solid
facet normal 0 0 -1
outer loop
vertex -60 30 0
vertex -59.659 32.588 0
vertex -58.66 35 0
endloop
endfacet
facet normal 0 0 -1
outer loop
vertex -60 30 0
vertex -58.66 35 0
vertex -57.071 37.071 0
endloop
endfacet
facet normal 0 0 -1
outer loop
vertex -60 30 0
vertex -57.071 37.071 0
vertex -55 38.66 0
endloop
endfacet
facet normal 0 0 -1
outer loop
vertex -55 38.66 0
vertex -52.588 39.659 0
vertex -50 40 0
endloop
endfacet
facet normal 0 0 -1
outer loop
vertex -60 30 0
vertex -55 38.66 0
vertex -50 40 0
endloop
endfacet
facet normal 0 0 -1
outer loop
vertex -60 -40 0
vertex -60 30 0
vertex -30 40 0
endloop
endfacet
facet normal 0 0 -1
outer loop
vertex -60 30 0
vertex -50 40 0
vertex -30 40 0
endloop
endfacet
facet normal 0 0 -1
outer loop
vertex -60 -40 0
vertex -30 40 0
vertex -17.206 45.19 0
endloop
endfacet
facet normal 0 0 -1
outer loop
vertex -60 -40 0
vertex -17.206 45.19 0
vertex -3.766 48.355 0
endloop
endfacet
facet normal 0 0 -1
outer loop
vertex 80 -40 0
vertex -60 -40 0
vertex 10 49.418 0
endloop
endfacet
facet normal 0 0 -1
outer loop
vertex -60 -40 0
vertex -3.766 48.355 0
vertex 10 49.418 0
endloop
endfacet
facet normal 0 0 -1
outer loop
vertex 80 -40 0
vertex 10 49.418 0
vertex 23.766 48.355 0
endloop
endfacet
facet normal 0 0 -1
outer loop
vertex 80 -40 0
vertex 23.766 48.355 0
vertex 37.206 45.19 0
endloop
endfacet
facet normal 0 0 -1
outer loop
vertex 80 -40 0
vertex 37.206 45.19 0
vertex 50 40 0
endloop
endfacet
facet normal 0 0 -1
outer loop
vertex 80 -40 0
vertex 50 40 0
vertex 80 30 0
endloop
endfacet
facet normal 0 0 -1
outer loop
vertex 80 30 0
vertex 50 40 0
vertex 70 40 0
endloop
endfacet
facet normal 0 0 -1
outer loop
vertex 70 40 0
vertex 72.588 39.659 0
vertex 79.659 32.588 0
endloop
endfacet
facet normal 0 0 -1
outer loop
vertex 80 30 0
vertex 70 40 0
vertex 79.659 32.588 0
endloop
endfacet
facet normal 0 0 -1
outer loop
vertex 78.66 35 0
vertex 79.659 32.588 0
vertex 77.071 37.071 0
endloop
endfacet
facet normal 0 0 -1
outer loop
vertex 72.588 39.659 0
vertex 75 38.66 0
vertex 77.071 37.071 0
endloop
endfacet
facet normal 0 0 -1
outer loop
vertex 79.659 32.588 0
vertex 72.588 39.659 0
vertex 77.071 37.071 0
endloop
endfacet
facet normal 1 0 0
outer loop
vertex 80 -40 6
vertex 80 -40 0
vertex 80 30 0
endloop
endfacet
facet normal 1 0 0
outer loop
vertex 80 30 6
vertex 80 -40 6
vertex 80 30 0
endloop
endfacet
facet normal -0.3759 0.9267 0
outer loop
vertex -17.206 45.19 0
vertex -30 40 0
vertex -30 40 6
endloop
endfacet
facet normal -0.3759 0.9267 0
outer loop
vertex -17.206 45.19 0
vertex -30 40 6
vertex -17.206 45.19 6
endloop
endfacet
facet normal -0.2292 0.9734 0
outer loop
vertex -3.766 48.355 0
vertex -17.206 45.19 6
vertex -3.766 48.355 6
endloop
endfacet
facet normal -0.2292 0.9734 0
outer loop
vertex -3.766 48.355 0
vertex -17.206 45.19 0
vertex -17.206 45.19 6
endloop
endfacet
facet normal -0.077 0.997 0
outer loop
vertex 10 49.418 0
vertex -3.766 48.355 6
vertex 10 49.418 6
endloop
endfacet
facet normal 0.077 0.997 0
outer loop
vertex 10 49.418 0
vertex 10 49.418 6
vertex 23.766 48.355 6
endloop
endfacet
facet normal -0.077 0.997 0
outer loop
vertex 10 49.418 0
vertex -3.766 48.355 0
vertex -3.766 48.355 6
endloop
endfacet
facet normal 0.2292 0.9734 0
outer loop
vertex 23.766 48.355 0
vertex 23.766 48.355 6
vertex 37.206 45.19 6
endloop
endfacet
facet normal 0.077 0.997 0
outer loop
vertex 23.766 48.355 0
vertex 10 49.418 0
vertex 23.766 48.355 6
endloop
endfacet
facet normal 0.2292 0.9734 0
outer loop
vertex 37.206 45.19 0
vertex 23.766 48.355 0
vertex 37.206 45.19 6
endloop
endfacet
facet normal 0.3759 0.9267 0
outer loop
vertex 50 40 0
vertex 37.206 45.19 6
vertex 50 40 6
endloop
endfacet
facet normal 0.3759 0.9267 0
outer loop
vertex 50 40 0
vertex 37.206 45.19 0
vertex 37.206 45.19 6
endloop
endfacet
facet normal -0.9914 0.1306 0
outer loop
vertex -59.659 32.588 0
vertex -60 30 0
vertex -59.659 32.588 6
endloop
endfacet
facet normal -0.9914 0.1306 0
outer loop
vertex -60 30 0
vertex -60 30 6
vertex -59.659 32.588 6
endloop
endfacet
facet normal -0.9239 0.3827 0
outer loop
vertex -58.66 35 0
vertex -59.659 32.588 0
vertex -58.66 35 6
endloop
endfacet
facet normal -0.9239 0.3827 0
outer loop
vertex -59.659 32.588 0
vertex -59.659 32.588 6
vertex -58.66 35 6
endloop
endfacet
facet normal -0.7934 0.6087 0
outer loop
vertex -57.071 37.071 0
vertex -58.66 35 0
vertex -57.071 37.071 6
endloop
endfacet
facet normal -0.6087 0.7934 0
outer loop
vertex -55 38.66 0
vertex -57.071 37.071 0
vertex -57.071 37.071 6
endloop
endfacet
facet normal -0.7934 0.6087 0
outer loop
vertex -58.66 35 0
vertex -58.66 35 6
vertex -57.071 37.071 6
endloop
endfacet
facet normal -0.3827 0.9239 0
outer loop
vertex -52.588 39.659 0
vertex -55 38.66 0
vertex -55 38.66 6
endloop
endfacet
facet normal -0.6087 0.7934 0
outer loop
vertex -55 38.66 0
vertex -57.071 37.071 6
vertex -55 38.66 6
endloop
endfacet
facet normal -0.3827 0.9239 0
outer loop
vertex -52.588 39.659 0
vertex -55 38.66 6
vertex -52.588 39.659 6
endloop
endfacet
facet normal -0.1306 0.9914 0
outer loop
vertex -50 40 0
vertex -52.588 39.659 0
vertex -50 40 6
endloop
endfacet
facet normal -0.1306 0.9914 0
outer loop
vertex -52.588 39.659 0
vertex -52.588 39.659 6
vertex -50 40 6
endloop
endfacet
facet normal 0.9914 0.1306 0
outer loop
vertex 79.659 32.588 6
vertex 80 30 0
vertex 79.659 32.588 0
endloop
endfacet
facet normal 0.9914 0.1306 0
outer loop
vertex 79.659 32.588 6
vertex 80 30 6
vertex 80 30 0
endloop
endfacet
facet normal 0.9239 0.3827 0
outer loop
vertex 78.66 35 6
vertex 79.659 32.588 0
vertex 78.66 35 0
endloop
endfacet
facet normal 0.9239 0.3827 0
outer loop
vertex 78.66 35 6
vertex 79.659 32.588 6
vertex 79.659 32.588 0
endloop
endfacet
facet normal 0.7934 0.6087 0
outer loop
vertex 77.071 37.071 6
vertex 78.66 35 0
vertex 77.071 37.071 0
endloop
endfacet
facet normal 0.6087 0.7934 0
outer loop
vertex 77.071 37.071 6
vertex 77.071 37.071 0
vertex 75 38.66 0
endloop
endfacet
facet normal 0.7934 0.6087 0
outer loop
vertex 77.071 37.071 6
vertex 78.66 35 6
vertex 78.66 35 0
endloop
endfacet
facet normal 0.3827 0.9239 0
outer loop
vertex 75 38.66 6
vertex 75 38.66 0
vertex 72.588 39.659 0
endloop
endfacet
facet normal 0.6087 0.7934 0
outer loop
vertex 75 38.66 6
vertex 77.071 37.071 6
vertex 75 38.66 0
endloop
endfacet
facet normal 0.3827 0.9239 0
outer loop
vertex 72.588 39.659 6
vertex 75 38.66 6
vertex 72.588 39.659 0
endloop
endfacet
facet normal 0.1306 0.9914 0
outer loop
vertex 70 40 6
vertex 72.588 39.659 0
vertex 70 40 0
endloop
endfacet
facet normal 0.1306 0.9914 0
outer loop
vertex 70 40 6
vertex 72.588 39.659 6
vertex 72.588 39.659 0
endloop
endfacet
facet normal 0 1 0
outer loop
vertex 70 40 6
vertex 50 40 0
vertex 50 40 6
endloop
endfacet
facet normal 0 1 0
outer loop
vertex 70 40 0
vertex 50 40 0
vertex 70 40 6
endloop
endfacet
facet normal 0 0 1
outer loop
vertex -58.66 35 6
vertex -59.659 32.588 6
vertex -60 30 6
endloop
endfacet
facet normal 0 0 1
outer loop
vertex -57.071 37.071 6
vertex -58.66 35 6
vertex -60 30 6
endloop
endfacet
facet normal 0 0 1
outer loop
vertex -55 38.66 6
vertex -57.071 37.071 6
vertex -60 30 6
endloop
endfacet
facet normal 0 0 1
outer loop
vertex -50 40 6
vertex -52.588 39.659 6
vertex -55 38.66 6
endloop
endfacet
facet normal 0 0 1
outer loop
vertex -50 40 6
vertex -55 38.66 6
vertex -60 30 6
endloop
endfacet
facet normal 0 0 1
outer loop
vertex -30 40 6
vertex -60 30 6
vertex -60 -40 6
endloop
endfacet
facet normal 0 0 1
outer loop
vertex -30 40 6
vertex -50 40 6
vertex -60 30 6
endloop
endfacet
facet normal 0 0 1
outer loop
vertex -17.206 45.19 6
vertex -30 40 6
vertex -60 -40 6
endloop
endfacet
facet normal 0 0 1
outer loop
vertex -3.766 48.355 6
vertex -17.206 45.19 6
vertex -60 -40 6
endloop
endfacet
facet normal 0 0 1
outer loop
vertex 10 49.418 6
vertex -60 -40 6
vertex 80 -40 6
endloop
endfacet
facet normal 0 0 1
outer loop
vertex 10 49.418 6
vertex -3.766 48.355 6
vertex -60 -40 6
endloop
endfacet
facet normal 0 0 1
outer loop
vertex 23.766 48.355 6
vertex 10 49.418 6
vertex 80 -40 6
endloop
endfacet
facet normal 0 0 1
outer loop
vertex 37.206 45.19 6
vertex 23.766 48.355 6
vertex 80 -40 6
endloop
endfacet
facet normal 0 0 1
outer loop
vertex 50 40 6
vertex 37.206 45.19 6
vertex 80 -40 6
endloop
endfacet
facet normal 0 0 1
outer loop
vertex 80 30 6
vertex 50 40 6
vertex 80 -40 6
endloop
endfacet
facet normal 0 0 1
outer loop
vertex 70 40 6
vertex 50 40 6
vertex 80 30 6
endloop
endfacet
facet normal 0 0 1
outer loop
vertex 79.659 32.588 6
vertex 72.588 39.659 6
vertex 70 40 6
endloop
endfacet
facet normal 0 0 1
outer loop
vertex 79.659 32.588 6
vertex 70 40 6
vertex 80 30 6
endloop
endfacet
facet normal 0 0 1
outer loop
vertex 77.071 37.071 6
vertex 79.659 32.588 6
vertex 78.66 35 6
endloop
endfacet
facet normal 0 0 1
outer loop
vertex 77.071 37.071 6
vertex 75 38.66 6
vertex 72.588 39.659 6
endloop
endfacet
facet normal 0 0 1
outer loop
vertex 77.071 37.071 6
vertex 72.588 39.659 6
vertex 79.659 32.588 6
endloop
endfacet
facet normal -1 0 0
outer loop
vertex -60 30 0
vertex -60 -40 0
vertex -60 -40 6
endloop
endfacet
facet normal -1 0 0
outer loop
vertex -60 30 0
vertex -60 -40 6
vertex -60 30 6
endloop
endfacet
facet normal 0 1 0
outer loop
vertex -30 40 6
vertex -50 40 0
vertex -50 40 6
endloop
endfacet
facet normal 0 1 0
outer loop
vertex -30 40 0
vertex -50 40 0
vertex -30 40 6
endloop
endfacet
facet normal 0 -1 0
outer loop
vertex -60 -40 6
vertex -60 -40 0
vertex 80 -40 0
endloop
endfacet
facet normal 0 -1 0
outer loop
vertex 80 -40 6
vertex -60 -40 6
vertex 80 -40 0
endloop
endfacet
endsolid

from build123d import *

# Parameters (mm, degrees)
ESQUISSE1_W      = 140
ESQUISSE1_H      = 80
EXTRUSION1_DEPTH = 6
CONG_1_R         = 10
EXTRUSION2_DEPTH = 6


with BuildPart() as part:
    # Esquisse1 → Extrusion1 (new body)
    with BuildSketch(Plane.XY):
        with Locations((10, 0)):
            Rectangle(ESQUISSE1_W, ESQUISSE1_H)
    extrude(amount=EXTRUSION1_DEPTH)

    # Congé1
    cong_1_edges = [part.edges().sort_by_distance(p)[0] for p in [
        (-60, 40, 3),
        (80, 40, 3),
    ]]
    fillet(cong_1_edges, radius=CONG_1_R)

    # Esquisse6 → Extrusion2 (add)
    with BuildSketch(Plane(origin=(0, 0, 0), x_dir=(-1, 0, 0), z_dir=(0, 0, -1))):
        with BuildLine():
            Line((-50, 40), (30, 40))
            ThreePointArc((30, 40), (-10, 49.417796635), (-50, 40))
        make_face()
    extrude(amount=-EXTRUSION2_DEPTH)


solid = part.part
